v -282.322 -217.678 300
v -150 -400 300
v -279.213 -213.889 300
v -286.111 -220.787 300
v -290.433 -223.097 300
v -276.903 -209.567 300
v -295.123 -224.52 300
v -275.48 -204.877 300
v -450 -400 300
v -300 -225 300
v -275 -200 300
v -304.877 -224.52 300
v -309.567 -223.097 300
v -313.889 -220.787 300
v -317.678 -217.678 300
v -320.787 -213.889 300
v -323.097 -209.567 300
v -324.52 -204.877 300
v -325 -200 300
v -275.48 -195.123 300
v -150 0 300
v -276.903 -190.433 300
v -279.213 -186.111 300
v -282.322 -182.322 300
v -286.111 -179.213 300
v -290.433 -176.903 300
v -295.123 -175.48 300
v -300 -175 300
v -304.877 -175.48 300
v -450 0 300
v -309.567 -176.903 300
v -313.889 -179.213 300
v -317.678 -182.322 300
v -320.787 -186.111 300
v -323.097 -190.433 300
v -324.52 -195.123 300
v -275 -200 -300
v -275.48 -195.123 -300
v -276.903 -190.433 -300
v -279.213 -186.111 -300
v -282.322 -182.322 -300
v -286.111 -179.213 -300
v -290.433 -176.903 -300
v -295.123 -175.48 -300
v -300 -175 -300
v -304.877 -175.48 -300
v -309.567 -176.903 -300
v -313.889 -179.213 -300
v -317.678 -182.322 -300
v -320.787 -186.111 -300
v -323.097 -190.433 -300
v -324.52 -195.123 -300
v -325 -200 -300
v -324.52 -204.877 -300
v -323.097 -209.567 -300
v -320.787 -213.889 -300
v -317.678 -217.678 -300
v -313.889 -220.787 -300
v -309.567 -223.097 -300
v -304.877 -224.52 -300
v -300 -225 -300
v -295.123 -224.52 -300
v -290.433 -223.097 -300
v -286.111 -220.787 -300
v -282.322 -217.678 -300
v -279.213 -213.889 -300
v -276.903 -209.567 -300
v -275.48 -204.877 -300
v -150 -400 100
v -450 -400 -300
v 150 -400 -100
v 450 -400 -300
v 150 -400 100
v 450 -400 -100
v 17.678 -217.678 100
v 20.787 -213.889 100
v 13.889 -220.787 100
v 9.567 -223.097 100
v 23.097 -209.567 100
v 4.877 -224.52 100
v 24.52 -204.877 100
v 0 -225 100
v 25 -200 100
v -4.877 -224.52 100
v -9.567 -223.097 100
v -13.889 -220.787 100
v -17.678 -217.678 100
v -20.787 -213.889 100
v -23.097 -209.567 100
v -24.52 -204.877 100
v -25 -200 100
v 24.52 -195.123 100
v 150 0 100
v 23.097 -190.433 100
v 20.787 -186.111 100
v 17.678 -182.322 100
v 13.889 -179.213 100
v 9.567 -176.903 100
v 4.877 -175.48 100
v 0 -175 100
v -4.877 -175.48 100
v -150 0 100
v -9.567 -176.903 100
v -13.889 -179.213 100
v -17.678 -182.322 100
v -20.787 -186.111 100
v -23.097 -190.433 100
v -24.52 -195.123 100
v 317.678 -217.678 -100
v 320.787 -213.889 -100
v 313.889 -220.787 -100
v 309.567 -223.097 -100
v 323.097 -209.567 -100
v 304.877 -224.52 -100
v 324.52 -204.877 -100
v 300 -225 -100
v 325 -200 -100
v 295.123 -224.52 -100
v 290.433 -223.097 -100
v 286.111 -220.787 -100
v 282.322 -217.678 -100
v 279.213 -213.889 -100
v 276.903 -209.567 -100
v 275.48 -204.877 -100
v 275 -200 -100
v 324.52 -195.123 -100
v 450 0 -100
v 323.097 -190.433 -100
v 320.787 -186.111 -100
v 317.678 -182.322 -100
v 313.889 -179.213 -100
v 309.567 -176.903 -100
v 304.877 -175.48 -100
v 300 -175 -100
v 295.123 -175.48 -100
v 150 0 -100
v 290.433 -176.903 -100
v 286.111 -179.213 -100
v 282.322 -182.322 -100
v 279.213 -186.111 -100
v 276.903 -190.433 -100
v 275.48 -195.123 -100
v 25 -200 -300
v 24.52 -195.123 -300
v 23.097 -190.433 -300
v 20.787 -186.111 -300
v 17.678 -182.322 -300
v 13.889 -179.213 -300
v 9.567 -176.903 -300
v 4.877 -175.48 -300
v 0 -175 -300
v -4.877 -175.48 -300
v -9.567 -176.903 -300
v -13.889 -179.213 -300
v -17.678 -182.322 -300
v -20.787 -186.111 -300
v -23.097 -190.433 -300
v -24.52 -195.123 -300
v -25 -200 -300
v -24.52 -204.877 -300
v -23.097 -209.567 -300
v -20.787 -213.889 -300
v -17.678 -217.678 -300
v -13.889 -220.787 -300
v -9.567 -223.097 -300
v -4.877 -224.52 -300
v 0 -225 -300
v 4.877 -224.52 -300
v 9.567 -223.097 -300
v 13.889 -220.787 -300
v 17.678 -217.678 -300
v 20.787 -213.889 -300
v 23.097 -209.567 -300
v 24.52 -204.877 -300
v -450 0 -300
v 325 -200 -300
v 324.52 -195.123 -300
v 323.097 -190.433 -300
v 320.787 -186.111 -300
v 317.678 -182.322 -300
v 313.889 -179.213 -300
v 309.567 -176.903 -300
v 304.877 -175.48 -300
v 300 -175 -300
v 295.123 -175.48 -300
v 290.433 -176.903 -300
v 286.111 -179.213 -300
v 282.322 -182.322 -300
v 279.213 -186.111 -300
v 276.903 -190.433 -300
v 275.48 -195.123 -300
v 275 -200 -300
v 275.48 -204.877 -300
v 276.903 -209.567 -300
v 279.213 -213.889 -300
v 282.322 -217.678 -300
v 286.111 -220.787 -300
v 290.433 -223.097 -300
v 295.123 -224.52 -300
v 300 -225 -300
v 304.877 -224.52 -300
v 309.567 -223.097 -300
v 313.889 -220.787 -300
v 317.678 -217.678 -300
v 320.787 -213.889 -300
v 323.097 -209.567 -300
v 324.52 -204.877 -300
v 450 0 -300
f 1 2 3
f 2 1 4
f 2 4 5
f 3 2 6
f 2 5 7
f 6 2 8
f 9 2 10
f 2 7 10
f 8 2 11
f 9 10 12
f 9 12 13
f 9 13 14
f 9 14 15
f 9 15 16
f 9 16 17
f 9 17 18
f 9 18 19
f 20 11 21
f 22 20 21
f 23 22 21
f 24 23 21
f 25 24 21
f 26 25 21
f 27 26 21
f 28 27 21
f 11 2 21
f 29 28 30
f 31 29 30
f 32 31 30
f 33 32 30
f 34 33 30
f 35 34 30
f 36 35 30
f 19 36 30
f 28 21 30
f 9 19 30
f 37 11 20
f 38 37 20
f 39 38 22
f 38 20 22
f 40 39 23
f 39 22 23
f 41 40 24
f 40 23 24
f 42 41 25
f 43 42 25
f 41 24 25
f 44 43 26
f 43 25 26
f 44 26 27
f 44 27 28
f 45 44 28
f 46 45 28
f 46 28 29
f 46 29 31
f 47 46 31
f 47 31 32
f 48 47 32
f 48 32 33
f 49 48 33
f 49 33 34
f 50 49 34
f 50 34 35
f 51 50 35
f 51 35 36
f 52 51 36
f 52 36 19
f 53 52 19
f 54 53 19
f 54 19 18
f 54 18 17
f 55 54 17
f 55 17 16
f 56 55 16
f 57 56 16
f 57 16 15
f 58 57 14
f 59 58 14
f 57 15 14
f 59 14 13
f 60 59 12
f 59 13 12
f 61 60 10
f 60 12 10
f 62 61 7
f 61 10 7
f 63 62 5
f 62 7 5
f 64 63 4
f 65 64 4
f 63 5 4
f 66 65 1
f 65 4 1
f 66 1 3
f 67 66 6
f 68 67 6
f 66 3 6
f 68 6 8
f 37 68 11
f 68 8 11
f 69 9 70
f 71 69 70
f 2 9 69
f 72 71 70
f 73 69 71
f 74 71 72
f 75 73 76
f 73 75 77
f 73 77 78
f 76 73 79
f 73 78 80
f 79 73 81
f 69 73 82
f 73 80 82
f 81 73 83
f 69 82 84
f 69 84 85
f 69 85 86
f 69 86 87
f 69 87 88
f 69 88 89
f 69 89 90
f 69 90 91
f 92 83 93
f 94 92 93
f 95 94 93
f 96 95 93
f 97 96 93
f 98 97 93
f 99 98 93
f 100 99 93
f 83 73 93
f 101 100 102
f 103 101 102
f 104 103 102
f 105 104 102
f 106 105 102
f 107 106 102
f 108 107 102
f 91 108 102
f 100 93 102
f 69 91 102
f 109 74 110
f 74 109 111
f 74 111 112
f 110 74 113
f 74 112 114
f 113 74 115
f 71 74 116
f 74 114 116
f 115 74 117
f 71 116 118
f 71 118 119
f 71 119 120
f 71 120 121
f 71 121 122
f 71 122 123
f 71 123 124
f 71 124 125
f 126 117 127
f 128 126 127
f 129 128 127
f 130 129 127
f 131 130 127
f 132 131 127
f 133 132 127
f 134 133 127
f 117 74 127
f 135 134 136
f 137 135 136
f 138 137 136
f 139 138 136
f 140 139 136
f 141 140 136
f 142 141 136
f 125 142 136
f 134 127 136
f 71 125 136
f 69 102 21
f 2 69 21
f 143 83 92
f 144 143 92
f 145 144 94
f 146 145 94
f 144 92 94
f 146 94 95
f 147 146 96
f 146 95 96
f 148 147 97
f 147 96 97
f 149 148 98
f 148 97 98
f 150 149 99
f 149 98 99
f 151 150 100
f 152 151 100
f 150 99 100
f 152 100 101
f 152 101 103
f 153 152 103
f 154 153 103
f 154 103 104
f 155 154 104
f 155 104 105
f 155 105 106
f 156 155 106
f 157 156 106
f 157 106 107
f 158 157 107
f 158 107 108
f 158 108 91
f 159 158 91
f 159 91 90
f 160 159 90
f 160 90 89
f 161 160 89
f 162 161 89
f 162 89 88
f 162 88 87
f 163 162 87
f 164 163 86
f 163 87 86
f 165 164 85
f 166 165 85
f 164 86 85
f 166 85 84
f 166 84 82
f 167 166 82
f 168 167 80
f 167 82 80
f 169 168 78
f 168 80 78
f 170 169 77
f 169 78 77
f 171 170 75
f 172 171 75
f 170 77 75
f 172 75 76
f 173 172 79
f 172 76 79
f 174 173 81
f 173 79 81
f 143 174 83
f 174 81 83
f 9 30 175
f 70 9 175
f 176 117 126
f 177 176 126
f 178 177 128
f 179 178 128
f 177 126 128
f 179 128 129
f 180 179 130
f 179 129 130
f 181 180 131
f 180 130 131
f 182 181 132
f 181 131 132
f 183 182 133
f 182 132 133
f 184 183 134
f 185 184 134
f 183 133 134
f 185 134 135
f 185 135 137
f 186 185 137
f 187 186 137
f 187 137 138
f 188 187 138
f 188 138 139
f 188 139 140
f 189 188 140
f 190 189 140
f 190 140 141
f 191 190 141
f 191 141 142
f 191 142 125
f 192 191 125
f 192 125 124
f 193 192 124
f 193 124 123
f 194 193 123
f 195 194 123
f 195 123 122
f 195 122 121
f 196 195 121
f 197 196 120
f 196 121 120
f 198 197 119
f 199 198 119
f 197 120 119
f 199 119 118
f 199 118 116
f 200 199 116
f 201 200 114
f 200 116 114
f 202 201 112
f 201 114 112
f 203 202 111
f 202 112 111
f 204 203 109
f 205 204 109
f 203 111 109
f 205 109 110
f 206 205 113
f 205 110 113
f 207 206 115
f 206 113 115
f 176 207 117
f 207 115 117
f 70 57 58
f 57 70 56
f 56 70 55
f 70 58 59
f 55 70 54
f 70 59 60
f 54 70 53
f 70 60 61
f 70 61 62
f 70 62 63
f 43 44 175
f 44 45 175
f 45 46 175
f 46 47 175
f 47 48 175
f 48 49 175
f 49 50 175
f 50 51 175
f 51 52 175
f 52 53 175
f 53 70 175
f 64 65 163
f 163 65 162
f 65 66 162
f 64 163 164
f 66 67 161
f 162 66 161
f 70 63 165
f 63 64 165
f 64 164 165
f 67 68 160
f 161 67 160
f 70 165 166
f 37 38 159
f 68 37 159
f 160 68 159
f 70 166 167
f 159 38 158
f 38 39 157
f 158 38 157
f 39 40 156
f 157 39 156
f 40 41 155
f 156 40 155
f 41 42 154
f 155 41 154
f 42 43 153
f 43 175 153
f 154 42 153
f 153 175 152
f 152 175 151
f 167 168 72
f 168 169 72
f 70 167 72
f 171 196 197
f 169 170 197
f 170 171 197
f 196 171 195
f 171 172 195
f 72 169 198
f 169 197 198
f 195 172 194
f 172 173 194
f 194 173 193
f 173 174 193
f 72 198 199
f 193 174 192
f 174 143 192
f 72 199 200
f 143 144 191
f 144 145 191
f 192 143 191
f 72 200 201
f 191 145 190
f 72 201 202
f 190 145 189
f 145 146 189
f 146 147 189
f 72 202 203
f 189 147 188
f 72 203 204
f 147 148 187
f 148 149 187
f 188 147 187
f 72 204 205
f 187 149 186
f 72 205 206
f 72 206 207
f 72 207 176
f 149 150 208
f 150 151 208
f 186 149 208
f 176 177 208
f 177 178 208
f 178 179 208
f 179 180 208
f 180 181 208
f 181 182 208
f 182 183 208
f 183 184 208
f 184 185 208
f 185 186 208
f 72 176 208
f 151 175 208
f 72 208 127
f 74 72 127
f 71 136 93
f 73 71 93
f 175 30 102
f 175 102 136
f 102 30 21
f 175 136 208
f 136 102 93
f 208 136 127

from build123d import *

# Parameters (mm, degrees)
F1_DEPTH = 400
F2_R     = 25
F3_DEPTH = 600.001


with BuildPart() as f1:
    # F0 (on Front) → F1 (new body)
    with BuildSketch(Plane.XZ):
        Polygon((-150, 300), (-450, 300), (-450, -300), (450, -300), (450, -100), (150, -100), (150, 100), (-150, 100), align=None)
    extrude(amount=F1_DEPTH)

    # F2 (on face) → F3 (cut, through all)
    with BuildSketch(Plane.XY.offset(300)):
        with Locations((-300, -200)):
            Circle(F2_R)
        with Locations((0, -200)):
            Circle(F2_R)
        with Locations((300, -200)):
            Circle(F2_R)
    extrude(amount=-F3_DEPTH, mode=Mode.SUBTRACT)


solid = f1.part
